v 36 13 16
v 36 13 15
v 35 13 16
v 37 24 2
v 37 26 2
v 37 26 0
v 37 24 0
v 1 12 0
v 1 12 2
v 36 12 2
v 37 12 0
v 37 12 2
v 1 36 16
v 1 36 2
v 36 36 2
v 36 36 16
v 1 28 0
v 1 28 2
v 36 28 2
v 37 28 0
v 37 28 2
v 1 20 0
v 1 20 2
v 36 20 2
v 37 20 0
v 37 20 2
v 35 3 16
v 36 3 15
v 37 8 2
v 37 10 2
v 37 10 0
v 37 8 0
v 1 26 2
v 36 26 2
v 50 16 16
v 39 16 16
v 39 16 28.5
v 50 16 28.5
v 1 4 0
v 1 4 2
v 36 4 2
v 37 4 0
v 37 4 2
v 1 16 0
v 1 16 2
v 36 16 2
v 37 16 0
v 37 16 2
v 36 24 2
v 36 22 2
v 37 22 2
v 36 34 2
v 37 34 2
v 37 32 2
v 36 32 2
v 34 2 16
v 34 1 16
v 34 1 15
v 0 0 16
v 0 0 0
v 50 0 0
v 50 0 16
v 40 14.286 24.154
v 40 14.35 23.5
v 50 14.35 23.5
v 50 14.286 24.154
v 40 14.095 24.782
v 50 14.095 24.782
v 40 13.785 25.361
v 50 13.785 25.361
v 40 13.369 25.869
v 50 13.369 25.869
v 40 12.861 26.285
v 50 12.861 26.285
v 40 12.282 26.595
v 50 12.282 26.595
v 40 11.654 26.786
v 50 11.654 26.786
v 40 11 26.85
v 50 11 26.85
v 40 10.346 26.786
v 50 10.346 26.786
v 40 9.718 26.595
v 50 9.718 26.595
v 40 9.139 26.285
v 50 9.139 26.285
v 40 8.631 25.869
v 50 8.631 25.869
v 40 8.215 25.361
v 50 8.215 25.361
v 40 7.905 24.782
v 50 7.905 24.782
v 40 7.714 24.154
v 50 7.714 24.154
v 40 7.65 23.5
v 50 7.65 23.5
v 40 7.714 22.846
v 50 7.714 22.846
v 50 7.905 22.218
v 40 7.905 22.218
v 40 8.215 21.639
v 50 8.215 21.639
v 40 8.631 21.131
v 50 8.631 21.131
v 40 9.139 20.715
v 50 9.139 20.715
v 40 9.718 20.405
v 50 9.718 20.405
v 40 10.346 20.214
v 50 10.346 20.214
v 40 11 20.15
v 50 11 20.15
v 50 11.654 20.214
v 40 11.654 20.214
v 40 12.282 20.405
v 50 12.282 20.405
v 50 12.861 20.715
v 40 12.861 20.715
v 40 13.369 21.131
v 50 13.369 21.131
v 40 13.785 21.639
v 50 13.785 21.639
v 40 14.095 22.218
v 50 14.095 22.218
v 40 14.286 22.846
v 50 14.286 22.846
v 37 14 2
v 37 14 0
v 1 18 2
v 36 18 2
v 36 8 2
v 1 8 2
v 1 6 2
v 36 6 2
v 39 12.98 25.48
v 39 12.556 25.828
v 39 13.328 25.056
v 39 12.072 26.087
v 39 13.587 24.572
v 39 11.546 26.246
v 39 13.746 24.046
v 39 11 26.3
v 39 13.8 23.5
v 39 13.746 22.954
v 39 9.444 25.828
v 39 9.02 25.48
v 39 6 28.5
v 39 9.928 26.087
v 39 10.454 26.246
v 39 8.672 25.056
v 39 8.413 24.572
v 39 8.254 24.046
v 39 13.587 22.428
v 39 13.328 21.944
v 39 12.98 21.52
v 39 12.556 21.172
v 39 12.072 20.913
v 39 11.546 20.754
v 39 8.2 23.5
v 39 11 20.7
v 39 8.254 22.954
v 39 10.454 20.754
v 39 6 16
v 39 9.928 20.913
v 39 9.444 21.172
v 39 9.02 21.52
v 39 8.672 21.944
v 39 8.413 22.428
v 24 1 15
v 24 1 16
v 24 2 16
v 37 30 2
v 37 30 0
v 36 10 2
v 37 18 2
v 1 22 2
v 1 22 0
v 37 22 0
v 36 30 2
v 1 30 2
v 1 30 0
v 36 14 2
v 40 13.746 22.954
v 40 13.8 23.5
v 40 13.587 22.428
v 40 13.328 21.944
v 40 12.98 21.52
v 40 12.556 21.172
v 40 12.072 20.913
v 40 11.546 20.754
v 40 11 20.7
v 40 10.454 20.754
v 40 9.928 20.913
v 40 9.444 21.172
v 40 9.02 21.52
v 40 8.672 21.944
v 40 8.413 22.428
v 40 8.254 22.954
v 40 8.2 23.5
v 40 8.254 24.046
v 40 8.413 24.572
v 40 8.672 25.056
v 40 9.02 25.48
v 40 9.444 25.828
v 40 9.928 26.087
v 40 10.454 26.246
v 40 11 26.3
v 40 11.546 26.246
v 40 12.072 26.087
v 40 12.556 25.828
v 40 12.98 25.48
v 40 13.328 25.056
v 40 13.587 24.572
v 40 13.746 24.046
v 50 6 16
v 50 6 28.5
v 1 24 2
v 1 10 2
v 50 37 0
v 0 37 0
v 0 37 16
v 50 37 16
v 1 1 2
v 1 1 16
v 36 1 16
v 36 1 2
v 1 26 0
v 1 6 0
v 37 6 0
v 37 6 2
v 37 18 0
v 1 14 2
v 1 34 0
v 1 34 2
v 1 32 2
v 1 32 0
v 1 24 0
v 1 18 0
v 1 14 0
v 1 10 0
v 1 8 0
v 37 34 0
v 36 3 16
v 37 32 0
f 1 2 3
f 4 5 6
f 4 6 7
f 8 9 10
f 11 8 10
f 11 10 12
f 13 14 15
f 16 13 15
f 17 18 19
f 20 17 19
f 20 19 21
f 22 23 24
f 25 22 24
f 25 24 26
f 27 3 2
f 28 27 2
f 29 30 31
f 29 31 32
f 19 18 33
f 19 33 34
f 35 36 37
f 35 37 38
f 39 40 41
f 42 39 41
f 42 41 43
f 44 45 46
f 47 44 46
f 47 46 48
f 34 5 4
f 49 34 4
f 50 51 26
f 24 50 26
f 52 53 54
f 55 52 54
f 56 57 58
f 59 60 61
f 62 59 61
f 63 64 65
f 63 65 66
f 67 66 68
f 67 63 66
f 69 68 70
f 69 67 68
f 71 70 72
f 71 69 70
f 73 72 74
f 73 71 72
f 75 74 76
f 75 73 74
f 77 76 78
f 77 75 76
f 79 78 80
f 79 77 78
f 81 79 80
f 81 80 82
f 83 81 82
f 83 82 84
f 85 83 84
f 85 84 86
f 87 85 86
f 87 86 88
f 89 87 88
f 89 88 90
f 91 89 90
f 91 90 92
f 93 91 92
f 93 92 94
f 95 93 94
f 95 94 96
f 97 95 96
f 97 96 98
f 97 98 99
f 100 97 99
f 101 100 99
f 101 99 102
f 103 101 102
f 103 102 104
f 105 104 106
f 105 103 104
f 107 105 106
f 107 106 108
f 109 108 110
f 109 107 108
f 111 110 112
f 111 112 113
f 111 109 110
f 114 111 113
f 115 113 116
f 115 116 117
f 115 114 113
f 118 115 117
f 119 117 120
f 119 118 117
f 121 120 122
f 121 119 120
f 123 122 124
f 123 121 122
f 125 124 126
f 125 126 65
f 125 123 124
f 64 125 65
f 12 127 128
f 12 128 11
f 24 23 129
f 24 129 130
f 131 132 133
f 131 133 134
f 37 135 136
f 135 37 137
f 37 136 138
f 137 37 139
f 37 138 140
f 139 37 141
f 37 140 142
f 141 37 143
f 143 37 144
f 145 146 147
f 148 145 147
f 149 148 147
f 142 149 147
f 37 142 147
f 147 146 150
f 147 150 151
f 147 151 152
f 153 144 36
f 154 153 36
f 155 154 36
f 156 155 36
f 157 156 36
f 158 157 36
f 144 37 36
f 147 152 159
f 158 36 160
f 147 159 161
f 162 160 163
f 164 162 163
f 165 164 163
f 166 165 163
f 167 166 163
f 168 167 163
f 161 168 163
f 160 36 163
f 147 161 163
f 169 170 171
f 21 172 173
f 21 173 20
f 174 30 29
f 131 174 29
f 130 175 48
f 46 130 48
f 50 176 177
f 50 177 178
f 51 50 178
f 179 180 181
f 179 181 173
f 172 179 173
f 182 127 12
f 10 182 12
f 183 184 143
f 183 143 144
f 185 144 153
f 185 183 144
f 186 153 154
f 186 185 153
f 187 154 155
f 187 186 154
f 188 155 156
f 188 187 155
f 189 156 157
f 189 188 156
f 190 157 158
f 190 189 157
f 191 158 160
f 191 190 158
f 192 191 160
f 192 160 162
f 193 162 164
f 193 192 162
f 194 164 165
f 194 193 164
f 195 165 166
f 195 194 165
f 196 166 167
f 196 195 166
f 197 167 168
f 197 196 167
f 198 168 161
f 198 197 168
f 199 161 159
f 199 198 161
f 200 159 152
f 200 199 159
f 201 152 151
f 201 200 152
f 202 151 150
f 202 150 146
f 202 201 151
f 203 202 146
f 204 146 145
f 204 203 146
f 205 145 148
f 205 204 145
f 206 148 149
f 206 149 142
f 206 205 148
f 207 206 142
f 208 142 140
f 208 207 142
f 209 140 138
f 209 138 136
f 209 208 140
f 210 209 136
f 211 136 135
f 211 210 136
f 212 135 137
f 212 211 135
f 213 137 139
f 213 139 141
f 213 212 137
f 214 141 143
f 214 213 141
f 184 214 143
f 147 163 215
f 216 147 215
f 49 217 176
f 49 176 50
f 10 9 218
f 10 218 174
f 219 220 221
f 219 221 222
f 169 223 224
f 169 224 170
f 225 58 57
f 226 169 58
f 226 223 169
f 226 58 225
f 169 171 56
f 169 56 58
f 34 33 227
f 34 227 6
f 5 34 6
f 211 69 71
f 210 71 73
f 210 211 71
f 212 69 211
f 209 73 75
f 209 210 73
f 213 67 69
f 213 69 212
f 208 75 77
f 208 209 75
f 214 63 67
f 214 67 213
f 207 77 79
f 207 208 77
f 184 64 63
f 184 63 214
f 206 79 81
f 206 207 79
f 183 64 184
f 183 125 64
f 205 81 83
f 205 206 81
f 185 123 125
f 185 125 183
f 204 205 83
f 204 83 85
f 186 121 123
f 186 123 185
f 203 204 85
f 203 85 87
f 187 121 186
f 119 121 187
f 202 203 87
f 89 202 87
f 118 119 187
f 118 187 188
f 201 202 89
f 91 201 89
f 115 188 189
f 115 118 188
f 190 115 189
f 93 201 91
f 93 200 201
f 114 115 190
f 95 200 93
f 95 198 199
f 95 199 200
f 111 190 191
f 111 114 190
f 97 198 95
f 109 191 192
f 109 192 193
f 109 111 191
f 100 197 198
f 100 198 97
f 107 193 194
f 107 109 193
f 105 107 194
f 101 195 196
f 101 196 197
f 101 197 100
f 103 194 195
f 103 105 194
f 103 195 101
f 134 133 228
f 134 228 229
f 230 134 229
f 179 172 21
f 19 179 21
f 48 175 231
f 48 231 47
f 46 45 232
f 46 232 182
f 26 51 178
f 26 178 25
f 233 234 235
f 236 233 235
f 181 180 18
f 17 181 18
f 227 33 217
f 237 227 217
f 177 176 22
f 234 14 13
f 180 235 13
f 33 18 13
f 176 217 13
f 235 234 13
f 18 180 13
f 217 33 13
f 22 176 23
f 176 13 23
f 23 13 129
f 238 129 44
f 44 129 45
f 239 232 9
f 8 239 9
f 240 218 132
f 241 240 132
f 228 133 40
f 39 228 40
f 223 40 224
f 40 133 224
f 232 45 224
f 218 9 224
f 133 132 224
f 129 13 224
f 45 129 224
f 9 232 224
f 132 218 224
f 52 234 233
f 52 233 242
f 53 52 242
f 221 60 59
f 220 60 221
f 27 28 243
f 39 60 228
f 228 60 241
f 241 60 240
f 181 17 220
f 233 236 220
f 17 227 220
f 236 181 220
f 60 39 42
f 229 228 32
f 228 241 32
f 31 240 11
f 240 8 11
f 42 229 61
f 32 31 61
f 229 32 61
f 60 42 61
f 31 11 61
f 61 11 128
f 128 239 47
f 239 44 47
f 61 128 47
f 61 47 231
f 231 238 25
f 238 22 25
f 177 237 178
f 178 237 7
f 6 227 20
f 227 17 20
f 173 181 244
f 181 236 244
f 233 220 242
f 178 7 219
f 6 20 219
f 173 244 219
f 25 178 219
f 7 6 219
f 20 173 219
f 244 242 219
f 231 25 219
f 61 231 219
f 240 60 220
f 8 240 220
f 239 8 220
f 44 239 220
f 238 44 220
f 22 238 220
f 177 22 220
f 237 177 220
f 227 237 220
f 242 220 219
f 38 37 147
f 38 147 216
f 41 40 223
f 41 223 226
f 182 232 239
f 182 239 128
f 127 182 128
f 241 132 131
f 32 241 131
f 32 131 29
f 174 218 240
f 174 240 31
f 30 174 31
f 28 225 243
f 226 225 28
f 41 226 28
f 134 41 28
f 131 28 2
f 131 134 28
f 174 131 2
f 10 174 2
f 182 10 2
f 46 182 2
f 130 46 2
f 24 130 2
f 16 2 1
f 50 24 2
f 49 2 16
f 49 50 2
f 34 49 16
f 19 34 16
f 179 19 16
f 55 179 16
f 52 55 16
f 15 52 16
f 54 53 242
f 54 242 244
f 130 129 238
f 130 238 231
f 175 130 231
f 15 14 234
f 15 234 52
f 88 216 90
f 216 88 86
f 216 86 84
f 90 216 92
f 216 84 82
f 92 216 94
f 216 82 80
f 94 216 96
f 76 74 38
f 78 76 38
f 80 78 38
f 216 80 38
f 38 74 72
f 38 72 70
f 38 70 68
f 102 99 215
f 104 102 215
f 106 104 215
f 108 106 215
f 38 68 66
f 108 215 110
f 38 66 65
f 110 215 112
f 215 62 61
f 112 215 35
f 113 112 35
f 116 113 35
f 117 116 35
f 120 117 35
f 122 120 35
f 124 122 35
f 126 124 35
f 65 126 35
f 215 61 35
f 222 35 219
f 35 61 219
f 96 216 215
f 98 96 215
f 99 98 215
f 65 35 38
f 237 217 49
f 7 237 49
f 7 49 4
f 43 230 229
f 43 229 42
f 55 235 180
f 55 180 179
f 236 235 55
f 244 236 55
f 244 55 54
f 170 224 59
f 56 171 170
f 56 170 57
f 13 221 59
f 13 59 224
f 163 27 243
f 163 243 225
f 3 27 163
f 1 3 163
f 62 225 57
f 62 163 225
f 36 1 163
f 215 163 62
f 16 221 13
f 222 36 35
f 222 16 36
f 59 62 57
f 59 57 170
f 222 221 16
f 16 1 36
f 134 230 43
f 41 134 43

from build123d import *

# Parameters (mm, degrees)
BOX_W             = 50
BOX_H             = 37
BOX_DEPTH         = 16
BOX001_W          = 35
BOX001_H          = 35
BOX001_DEPTH      = 20
BOX002_W          = 11
BOX002_H          = 10
BOX002_DEPTH      = 12.5
CYLINDER_R        = 3.35
CYLINDER_DEPTH    = 22
SKETCH_W          = 2
SKETCH_H          = 36
POCKET_DEPTH      = 5
CYLINDER001_R     = 3.35
CYLINDER001_DEPTH = 1
CYLINDER002_R     = 2.8
CYLINDER002_DEPTH = 1
PAD_DEPTH         = 10
PAD001_DEPTH      = 10


with BuildPart() as part:
    # Box → Box (join)
    with BuildSketch(Plane.XY):
        with Locations((25, 18.5)):
            Rectangle(BOX_W, BOX_H)
    extrude(amount=BOX_DEPTH)

    # Box001 → Box001 (cut)
    with BuildSketch(Plane(origin=(1, 1, 2), x_dir=(1, 0, 0), z_dir=(0, 0, 1))):
        with Locations((17.5, 17.5)):
            Rectangle(BOX001_W, BOX001_H)
    extrude(amount=BOX001_DEPTH, mode=Mode.SUBTRACT)

    # Box002 → Box002 (join)
    with BuildSketch(Plane(origin=(39, 6, 16), x_dir=(1, 0, 0), z_dir=(0, 0, 1))):
        with Locations((5.5, 5)):
            Rectangle(BOX002_W, BOX002_H)
    extrude(amount=BOX002_DEPTH)

    # Cylinder → Cylinder (cut)
    with BuildSketch(Plane(origin=(28, 11, 23.5), x_dir=(0, 1, 0), z_dir=(1, 0, 0))):
        Circle(CYLINDER_R)
    extrude(amount=CYLINDER_DEPTH, mode=Mode.SUBTRACT)

    # Sketch (on Sketch) → Pocket (cut)
    with BuildSketch(Plane(origin=(38, 13.1, 2), x_dir=(0, -1, 0), z_dir=(0, 0, 1))):
        with Locations((-19.9, -19)):
            Rectangle(SKETCH_W, SKETCH_H)
        with Locations((-15.9, -19)):
            Rectangle(SKETCH_W, SKETCH_H)
        with Locations((-11.9, -19)):
            Rectangle(SKETCH_W, SKETCH_H)
        with Locations((-7.9, -19)):
            Rectangle(SKETCH_W, SKETCH_H)
        with Locations((-3.9, -19)):
            Rectangle(SKETCH_W, SKETCH_H)
        with Locations((0.1, -19)):
            Rectangle(SKETCH_W, SKETCH_H)
        with Locations((4.1, -19)):
            Rectangle(SKETCH_W, SKETCH_H)
        with Locations((8.1, -19)):
            Rectangle(SKETCH_W, SKETCH_H)
    extrude(amount=-POCKET_DEPTH, mode=Mode.SUBTRACT)

    # Cylinder001 → Cylinder001 (join)
    with BuildSketch(Plane(origin=(39, 11, 23.5), x_dir=(0, -1, 0), z_dir=(1, 0, 0))):
        Circle(CYLINDER001_R)
    extrude(amount=CYLINDER001_DEPTH)

    # Cylinder002 → Cylinder002 (cut)
    with BuildSketch(Plane(origin=(40, 11, 23.5), x_dir=(0, 1, 0), z_dir=(-1, 0, 0))):
        Circle(CYLINDER002_R)
    extrude(amount=CYLINDER002_DEPTH, mode=Mode.SUBTRACT)

    # Sketch002 (on Face11 of Cylinder002) → Pad (join)
    with BuildSketch(Plane(origin=(34, 11, 23.5), x_dir=(0, 1, 0), z_dir=(-1, 0, 0))):
        Polygon((-10, 7.5), (-9, 7.5), (-10, 8.5), align=None)
    extrude(amount=PAD_DEPTH)

    # Sketch003 (on Face10 of Pad) → Pad001 (join)
    with BuildSketch(Plane(origin=(40, 3, 23.5), x_dir=(0, 0, -1), z_dir=(0, 1, 0))):
        Polygon((7.5, 4), (7.5, 5), (8.5, 4), align=None)
    extrude(amount=PAD001_DEPTH)


solid = part.part
